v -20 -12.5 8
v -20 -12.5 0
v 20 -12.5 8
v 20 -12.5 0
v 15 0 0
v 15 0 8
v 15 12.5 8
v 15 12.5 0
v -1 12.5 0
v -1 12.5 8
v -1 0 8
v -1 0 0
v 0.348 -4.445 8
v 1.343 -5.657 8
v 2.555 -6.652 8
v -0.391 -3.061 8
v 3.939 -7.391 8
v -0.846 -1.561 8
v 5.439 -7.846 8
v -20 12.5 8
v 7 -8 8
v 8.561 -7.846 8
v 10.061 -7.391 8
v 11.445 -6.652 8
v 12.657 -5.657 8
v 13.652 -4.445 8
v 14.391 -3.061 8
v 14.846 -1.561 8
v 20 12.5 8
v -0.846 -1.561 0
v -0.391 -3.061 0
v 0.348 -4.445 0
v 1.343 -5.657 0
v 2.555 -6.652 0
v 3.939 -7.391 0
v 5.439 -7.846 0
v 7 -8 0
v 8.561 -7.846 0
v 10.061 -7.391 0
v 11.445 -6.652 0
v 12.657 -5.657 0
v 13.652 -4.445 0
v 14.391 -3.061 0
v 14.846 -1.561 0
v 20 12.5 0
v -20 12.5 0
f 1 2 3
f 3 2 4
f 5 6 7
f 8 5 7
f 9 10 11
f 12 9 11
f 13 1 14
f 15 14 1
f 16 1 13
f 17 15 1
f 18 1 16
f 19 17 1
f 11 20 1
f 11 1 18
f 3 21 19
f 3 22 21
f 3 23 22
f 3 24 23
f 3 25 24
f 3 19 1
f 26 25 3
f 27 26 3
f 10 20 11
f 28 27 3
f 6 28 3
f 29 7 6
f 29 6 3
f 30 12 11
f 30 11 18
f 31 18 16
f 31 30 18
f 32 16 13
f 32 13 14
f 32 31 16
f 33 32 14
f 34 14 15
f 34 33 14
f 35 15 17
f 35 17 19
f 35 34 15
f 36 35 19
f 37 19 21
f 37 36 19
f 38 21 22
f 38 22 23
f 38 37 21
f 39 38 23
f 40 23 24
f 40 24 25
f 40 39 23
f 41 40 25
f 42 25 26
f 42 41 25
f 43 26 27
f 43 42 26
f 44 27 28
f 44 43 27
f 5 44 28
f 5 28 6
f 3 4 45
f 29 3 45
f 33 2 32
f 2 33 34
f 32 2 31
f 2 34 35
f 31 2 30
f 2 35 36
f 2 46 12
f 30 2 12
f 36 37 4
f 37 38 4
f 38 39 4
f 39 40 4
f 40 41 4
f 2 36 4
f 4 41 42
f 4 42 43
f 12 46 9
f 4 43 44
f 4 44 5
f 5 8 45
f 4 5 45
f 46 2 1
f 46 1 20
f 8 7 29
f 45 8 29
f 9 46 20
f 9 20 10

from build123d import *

# Parameters (mm, degrees)
F0_W     = 40
F0_H     = 25
F0_R     = 8
F1_DEPTH = 8
F3_DEPTH = 8


# Not quite as in the source:
# - a feature of the source that left no trace in its solid (it failed there, or was rolled back) is left out


with BuildPart() as f1:
    # F0 (on Top) → F1 (new body)
    with BuildSketch(Plane.XY):
        Rectangle(F0_W, F0_H)
        with Locations((7, 0)):
            Circle(F0_R, mode=Mode.SUBTRACT)
    extrude(amount=F1_DEPTH)

    # F2 (on face) → F3 (cut, through all)
    with BuildSketch(Plane.XY.offset(8)):
        with BuildLine():
            Line((-1, 12.5), (-1, 0))
            ThreePointArc((-1, 0), (7, 8), (15, 0))
            Line((15, 0), (15, 12.5))
            Line((15, 12.5), (-1, 12.5))
        make_face()
    extrude(amount=-F3_DEPTH, mode=Mode.SUBTRACT)


solid = f1.part
